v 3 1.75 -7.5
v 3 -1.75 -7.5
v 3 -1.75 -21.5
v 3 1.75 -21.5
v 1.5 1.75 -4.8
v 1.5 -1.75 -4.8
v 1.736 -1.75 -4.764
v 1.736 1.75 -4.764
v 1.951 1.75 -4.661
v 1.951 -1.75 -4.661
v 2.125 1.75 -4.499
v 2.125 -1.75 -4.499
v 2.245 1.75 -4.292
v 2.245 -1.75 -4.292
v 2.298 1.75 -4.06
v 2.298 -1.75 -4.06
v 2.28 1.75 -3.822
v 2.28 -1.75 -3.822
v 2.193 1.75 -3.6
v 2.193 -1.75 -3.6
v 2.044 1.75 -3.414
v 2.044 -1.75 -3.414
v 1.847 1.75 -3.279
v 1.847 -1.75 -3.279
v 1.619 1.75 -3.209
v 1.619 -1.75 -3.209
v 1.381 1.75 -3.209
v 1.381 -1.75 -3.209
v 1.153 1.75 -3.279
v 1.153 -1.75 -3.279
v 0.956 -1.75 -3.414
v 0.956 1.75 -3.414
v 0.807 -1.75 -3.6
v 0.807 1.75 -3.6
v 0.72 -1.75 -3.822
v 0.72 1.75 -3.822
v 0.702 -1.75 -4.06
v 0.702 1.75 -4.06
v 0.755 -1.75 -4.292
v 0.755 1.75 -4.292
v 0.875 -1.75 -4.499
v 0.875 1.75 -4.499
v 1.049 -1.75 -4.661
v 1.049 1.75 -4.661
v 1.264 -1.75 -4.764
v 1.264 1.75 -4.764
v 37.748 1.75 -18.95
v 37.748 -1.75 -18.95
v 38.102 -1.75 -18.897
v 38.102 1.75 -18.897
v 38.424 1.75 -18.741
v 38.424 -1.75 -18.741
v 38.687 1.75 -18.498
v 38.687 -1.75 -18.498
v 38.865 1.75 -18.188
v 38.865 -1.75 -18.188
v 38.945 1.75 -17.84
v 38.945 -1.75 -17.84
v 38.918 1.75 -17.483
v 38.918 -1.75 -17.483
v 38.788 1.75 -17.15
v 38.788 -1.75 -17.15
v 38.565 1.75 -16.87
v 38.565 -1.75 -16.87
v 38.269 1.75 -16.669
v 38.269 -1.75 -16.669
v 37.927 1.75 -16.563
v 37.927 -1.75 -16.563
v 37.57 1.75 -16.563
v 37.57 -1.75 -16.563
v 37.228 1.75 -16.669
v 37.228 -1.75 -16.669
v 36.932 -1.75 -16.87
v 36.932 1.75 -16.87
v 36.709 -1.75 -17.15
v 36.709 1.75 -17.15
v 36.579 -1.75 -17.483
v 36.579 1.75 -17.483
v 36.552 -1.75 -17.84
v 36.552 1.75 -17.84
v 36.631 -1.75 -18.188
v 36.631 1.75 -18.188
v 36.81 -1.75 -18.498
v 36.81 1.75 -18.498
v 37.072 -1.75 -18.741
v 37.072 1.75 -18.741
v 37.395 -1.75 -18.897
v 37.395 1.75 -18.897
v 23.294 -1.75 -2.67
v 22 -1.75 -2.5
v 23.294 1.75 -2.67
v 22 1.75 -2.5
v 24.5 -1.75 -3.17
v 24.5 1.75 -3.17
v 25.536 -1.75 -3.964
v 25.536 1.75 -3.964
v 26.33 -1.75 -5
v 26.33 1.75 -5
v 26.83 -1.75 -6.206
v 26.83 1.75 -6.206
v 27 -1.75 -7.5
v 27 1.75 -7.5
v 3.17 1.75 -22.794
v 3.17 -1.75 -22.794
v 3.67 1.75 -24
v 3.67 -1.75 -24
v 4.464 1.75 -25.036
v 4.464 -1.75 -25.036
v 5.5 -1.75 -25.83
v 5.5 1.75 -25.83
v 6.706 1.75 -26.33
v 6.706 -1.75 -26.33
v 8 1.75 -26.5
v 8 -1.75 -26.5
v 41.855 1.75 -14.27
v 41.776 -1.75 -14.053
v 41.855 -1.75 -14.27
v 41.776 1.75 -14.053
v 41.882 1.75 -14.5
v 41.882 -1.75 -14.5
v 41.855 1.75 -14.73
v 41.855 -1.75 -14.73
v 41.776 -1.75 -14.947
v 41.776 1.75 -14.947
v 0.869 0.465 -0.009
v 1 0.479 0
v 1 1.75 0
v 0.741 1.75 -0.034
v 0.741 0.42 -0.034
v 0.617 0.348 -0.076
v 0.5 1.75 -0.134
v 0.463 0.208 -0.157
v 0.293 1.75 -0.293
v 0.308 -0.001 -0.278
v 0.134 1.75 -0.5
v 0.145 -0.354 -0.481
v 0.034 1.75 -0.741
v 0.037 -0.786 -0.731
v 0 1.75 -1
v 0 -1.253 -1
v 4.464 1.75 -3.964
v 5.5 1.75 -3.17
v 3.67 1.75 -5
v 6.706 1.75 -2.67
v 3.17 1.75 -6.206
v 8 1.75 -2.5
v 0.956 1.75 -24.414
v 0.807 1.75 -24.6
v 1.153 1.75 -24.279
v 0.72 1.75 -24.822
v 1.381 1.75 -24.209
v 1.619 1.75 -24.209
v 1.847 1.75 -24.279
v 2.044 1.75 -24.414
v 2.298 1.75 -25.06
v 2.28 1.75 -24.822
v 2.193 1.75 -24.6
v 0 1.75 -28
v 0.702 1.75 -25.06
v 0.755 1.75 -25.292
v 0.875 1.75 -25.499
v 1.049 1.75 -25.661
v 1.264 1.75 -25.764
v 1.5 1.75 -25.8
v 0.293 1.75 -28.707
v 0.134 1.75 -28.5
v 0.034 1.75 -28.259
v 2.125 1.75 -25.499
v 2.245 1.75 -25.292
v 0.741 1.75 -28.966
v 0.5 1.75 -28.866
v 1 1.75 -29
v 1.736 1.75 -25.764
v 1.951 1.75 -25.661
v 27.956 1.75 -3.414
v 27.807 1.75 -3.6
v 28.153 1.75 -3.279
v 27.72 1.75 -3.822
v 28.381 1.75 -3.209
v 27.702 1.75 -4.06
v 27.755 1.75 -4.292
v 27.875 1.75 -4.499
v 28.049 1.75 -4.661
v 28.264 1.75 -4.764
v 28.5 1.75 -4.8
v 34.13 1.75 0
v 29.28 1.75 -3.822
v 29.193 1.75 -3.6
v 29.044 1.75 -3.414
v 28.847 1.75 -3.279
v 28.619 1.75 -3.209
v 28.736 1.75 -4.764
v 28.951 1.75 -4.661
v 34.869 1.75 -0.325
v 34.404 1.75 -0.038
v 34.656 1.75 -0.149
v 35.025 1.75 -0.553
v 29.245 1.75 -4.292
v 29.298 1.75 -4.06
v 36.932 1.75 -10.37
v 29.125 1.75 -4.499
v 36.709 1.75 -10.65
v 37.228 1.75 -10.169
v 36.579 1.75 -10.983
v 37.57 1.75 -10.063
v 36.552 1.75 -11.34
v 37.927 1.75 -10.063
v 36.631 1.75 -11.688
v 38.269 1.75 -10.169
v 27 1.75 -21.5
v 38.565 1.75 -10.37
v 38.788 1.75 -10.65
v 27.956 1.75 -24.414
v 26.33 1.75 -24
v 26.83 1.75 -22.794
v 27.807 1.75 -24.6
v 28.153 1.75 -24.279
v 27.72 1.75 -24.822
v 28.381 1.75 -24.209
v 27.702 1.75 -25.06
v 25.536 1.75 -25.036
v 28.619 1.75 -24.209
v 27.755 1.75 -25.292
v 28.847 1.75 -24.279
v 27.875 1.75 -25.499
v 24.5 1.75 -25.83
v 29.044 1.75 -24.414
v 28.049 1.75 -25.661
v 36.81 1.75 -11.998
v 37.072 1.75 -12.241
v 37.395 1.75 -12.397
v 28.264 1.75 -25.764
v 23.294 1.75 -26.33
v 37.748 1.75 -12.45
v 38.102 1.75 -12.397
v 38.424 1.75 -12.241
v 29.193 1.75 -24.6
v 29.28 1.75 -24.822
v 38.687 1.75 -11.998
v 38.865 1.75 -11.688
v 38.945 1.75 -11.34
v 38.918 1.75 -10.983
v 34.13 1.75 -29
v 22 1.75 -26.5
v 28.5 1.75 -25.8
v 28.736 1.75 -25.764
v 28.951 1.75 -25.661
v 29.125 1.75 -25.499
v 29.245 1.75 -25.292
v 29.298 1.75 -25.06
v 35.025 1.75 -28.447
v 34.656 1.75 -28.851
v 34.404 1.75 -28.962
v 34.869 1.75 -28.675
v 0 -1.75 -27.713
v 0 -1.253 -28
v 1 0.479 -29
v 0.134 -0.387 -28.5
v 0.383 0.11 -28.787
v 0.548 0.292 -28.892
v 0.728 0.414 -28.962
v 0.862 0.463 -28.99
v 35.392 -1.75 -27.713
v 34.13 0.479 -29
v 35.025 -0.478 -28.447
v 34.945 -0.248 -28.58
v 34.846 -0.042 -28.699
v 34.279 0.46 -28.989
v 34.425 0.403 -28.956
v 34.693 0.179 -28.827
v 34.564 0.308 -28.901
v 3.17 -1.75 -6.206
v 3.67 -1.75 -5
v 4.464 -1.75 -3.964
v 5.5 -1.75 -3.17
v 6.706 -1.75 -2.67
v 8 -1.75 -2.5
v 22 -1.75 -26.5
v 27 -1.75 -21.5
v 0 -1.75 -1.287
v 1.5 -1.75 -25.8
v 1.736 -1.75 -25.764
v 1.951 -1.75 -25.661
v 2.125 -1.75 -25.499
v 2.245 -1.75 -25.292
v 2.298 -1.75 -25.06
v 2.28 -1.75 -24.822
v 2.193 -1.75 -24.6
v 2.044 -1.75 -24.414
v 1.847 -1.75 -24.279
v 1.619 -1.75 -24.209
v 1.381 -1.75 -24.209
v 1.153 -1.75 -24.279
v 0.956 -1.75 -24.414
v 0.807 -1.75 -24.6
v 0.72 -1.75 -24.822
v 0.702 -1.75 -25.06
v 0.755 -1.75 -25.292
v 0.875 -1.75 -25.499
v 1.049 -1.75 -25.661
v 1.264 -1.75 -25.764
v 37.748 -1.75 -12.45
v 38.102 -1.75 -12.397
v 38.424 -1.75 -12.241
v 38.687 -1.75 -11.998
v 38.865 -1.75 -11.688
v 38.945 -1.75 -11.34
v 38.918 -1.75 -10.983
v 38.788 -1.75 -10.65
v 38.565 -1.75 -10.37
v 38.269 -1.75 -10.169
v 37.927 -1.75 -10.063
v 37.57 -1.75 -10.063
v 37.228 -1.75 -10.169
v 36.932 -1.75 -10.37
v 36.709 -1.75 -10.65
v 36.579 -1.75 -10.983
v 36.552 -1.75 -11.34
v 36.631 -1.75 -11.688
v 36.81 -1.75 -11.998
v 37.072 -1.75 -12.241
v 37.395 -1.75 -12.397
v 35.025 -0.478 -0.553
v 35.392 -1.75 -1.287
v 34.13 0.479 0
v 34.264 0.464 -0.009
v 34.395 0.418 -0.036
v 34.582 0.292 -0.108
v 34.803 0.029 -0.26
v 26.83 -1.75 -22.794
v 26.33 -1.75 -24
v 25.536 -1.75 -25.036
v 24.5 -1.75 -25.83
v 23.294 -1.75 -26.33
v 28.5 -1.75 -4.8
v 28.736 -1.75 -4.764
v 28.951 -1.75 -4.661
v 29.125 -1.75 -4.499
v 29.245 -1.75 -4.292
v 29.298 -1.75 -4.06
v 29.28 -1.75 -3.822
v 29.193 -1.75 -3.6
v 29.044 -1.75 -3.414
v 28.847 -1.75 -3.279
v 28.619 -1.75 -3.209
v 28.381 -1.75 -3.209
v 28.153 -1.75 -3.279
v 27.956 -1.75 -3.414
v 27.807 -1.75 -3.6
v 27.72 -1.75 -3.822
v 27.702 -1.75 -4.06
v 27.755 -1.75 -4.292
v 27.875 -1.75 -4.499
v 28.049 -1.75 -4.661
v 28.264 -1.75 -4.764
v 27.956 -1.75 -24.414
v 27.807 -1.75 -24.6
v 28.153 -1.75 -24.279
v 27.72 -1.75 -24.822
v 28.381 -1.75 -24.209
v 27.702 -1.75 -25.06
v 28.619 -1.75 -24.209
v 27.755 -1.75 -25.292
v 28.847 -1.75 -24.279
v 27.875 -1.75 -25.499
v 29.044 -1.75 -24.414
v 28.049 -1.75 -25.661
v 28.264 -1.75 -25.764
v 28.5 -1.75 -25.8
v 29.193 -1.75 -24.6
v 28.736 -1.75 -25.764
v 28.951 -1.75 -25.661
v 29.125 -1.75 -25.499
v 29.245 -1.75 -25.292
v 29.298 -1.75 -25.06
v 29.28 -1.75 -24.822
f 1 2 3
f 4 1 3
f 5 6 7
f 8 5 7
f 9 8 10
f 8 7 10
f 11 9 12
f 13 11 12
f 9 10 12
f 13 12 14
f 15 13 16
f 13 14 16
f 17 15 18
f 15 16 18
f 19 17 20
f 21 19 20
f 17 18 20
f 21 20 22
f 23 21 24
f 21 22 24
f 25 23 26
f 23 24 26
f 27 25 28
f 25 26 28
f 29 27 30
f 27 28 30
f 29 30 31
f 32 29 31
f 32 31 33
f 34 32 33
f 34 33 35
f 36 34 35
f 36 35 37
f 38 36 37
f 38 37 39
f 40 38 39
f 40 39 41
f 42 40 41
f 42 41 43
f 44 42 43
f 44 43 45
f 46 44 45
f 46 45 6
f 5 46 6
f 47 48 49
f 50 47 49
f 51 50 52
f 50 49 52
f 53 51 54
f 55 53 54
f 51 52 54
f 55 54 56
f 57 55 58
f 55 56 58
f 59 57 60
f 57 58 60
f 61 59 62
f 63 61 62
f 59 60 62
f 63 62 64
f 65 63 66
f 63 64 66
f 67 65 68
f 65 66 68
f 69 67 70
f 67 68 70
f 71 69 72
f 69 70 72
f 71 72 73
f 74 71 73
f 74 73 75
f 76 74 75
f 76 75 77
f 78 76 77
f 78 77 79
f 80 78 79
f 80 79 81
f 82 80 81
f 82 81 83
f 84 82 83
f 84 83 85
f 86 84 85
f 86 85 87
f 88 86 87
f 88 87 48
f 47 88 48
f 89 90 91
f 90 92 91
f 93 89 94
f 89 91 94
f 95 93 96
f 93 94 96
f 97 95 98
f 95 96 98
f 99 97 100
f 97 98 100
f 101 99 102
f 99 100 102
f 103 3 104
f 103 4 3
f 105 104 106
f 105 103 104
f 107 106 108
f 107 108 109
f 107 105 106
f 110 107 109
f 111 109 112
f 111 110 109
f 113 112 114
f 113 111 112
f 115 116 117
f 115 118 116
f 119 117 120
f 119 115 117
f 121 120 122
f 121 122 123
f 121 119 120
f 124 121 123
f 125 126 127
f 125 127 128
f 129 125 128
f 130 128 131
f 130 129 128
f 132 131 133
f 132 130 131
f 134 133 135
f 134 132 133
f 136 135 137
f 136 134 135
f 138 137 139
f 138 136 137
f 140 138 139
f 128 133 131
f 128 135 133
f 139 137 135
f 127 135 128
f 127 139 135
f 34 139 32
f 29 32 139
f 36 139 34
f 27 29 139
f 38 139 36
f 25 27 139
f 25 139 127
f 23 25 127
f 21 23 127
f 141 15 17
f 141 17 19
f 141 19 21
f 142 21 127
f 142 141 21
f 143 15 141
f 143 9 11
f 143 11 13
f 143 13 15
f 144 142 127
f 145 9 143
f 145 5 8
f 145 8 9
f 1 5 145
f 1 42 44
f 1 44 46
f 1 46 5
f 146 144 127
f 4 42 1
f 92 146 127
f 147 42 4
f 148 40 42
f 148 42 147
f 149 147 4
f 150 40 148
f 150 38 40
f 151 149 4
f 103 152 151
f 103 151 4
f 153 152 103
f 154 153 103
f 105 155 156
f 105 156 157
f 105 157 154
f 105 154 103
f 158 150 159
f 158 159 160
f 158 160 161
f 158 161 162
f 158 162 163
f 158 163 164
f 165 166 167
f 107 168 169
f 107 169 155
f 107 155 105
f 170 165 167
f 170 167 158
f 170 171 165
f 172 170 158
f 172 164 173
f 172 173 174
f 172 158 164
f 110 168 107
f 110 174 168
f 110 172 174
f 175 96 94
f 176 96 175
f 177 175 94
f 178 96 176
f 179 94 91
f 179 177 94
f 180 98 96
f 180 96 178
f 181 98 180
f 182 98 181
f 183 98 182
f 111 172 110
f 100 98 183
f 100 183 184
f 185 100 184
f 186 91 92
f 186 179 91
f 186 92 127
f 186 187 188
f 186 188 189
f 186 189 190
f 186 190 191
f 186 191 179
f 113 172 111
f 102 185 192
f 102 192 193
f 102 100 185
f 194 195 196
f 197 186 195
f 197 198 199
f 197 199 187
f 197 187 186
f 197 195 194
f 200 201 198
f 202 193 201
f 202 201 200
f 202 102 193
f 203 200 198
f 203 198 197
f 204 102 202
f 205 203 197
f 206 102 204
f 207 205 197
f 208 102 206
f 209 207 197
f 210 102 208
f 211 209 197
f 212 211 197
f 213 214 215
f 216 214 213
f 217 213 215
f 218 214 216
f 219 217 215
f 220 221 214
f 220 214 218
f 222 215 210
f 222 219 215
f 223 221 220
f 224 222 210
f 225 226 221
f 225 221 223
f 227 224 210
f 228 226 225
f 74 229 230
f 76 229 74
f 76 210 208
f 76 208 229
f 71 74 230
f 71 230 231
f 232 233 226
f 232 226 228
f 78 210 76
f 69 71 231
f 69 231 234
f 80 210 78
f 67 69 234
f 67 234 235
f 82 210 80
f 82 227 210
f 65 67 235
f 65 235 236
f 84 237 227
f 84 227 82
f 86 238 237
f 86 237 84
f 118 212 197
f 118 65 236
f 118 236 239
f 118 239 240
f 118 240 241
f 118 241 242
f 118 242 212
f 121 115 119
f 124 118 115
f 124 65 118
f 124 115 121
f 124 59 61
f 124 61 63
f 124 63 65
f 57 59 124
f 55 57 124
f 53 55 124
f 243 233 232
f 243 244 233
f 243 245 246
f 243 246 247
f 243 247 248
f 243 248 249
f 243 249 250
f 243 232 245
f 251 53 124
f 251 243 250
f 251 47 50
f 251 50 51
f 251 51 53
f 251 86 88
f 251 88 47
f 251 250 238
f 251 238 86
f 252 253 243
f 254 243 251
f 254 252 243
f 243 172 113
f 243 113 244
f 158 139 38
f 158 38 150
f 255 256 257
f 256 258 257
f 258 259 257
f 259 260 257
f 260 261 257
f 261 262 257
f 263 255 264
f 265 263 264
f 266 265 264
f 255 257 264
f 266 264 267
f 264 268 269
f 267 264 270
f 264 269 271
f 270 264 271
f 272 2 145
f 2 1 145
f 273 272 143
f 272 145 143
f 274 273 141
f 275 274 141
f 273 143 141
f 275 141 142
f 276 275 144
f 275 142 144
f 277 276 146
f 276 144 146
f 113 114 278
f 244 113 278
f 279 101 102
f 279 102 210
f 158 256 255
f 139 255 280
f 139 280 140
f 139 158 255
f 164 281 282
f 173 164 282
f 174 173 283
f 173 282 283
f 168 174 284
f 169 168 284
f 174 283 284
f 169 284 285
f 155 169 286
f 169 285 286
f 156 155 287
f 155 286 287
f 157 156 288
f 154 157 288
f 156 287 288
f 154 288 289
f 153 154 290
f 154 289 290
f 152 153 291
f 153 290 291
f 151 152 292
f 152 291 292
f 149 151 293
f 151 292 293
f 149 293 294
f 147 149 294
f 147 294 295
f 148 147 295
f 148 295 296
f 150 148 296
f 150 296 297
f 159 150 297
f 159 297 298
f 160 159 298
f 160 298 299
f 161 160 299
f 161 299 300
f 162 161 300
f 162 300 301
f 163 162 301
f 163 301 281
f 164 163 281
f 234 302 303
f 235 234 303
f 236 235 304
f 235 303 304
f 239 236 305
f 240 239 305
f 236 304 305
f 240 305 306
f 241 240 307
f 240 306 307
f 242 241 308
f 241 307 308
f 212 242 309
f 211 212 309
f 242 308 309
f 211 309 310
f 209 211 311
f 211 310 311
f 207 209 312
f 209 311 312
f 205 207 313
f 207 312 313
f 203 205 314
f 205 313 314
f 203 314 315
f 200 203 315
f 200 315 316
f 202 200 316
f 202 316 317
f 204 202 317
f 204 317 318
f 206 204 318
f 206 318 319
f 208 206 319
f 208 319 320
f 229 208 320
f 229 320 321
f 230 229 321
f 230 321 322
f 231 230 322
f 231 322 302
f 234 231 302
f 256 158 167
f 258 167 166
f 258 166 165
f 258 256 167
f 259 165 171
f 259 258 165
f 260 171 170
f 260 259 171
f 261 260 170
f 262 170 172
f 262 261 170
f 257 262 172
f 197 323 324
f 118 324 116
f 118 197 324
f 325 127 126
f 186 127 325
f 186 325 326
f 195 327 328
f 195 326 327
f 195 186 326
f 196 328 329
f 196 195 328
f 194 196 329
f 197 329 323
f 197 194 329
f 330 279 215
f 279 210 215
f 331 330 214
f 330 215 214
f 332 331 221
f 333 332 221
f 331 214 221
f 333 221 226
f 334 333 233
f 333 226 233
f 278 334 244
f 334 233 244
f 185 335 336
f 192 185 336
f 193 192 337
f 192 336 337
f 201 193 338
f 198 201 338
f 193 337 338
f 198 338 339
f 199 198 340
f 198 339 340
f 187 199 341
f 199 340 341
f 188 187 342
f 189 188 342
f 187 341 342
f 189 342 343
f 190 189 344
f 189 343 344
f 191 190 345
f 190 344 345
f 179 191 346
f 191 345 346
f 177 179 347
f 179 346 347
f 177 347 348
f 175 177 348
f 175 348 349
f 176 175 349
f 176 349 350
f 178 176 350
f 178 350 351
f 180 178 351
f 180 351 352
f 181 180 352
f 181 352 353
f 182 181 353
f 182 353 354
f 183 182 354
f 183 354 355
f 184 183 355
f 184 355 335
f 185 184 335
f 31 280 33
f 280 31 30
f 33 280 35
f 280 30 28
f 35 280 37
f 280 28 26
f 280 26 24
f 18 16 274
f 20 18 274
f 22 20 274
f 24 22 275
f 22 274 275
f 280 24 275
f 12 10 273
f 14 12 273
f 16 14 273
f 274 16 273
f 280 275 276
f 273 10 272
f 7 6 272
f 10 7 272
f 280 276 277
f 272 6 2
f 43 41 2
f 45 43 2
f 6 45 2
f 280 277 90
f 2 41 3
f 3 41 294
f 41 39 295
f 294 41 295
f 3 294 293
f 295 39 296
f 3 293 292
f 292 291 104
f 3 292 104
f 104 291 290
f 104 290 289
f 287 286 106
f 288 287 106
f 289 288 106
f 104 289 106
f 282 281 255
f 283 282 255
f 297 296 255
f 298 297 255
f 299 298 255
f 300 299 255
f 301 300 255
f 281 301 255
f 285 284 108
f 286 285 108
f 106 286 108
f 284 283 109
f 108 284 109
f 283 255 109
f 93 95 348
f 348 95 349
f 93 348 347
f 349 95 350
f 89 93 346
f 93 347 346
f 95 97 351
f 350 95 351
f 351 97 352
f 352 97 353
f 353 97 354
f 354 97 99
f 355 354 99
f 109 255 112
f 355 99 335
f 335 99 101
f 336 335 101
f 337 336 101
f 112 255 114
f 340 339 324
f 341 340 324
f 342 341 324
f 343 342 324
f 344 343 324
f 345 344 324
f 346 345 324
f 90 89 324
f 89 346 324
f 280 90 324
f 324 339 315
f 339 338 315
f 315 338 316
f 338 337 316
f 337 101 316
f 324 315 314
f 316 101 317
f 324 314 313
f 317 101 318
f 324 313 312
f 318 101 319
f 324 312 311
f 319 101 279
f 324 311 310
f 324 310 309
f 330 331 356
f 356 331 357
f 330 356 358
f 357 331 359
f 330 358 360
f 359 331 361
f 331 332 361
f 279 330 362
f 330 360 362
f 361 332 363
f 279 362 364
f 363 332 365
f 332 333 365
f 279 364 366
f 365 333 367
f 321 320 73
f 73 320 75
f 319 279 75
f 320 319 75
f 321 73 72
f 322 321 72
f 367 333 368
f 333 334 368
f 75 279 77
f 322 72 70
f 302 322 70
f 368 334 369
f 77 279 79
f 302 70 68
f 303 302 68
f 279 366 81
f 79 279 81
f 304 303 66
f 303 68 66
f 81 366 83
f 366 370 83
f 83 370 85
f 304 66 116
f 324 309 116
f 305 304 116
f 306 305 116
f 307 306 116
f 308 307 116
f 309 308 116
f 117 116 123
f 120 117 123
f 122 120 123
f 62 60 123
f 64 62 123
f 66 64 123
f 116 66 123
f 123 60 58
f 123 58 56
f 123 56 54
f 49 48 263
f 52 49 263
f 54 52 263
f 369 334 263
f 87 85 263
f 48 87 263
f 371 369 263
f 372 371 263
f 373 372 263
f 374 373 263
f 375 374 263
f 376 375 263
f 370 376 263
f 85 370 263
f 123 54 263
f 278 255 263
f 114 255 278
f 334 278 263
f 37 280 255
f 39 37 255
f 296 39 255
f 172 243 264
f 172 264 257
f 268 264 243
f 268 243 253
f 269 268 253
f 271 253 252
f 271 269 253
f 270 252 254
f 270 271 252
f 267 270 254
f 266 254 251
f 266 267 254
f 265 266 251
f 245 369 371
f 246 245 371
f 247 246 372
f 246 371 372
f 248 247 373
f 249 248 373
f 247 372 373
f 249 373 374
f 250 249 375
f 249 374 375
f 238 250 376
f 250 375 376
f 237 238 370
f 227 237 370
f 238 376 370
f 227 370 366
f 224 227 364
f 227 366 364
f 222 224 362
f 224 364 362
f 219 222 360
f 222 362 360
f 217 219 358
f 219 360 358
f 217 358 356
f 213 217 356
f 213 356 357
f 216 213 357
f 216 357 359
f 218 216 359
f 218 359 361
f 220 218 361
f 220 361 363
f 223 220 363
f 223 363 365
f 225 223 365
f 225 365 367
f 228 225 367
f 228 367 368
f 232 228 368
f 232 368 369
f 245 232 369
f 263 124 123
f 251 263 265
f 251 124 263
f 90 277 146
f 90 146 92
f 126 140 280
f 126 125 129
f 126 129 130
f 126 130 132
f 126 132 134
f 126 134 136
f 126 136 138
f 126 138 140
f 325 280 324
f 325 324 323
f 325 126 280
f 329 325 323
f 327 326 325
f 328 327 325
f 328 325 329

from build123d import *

# Parameters (mm, degrees)
BOSS_EXTRUDE1_DEPTH     = 1.75
CUT_EXTRUDE1_DEPTH      = 52.069193258
CUT_EXTRUDE1_DEPTH_BACK = 52.069193258
SKETCH2_W               = 24
SKETCH2_H               = 24
FILLET1_R               = 5
M2X0_4_TAPPED_HOLE1_D   = 1.6
FILLET2_R               = 1
SKETCH11_W              = 39.153964454
SKETCH11_H              = 3.647114317
CUT_EXTRUDE2_DEPTH      = 51.858555782
M2_CLEARANCE_HOLE2_D    = 2.4


with BuildPart() as part:
    # Sketch1 → Boss-Extrude1 (new, symmetric)
    with BuildSketch(Plane(origin=(0, 0, 0), x_dir=(1, 0, 0), z_dir=(0, 1, 0))):
        Polygon((0, 0), (34.748434417, 0), (42, 14.5), (34.748434417, 29), (0, 29), align=None)
    extrude(amount=BOSS_EXTRUDE1_DEPTH, both=True)

    # Sketch2 → Cut-Extrude1 (cut, two sides: drawn at the far end of the back side and taken through both)
    with BuildSketch(Plane(origin=(0, 0, 0), x_dir=(1, 0, 0), z_dir=(0, 1, 0)).offset(-CUT_EXTRUDE1_DEPTH_BACK)):
        with Locations((15, 14.5)):
            Rectangle(SKETCH2_W, SKETCH2_H)
    extrude(amount=CUT_EXTRUDE1_DEPTH + CUT_EXTRUDE1_DEPTH_BACK, mode=Mode.SUBTRACT)

    # Fillet1
    fillet1_edges = [part.edges().sort_by_distance(p)[0] for p in [
        (3, 0, -2.5),
        (3, 0, -26.5),
        (27, 0, -26.5),
        (27, 0, -2.5),
    ]]
    fillet(fillet1_edges, radius=FILLET1_R)

    # M2x0.4 Tapped Hole1 (through all)
    with Locations(Plane(origin=(1.5, 1.75, -25), x_dir=(0, 0, 1), z_dir=(0, 1, 0))):
        with Locations((0, 0), (0, 27), (7.25, 36.248434417), (13.75, 36.248434417), (21, 27), (21, 0)):
            Hole(M2X0_4_TAPPED_HOLE1_D / 2)

    # Fillet2
    fillet2_edges = [part.edges().sort_by_distance(p)[0] for p in [
        (0, 0, -29),
        (34.748434417, 0, -29),
        (42, 0, -14.5),
        (34.748434417, 0, 0),
        (0, 0, 0),
    ]]
    fillet(fillet2_edges, radius=FILLET2_R)

    # Sketch11 → Cut-Extrude2 (cut, through all)
    with BuildSketch(Plane(origin=(0, 0.119868355, -0.207618081), x_dir=(1, 0, 0), z_dir=(9.104401052367775e-15, -0.5000000000000047, 0.866025403784436))):
        with Locations((19.576982227, -0.335580838)):
            Rectangle(SKETCH11_W, SKETCH11_H)
    cut_extrude2 = extrude(amount=CUT_EXTRUDE2_DEPTH, mode=Mode.SUBTRACT)

    # Mirror1: Cut-Extrude2 across plane
    add(cut_extrude2.mirror(Plane(origin=(0, 0, -14.5), x_dir=(1, 0, 0), z_dir=(0, 0, -1))), mode=Mode.SUBTRACT)

    # M2 Clearance Hole2 (through all)
    with Locations(Plane(origin=(37.748434417, 1.75, -17.75), x_dir=(0, 0, 1), z_dir=(0, 1, 0))):
        with Locations((0, 0), (6.5, 0)):
            Hole(M2_CLEARANCE_HOLE2_D / 2)


solid = part.part
